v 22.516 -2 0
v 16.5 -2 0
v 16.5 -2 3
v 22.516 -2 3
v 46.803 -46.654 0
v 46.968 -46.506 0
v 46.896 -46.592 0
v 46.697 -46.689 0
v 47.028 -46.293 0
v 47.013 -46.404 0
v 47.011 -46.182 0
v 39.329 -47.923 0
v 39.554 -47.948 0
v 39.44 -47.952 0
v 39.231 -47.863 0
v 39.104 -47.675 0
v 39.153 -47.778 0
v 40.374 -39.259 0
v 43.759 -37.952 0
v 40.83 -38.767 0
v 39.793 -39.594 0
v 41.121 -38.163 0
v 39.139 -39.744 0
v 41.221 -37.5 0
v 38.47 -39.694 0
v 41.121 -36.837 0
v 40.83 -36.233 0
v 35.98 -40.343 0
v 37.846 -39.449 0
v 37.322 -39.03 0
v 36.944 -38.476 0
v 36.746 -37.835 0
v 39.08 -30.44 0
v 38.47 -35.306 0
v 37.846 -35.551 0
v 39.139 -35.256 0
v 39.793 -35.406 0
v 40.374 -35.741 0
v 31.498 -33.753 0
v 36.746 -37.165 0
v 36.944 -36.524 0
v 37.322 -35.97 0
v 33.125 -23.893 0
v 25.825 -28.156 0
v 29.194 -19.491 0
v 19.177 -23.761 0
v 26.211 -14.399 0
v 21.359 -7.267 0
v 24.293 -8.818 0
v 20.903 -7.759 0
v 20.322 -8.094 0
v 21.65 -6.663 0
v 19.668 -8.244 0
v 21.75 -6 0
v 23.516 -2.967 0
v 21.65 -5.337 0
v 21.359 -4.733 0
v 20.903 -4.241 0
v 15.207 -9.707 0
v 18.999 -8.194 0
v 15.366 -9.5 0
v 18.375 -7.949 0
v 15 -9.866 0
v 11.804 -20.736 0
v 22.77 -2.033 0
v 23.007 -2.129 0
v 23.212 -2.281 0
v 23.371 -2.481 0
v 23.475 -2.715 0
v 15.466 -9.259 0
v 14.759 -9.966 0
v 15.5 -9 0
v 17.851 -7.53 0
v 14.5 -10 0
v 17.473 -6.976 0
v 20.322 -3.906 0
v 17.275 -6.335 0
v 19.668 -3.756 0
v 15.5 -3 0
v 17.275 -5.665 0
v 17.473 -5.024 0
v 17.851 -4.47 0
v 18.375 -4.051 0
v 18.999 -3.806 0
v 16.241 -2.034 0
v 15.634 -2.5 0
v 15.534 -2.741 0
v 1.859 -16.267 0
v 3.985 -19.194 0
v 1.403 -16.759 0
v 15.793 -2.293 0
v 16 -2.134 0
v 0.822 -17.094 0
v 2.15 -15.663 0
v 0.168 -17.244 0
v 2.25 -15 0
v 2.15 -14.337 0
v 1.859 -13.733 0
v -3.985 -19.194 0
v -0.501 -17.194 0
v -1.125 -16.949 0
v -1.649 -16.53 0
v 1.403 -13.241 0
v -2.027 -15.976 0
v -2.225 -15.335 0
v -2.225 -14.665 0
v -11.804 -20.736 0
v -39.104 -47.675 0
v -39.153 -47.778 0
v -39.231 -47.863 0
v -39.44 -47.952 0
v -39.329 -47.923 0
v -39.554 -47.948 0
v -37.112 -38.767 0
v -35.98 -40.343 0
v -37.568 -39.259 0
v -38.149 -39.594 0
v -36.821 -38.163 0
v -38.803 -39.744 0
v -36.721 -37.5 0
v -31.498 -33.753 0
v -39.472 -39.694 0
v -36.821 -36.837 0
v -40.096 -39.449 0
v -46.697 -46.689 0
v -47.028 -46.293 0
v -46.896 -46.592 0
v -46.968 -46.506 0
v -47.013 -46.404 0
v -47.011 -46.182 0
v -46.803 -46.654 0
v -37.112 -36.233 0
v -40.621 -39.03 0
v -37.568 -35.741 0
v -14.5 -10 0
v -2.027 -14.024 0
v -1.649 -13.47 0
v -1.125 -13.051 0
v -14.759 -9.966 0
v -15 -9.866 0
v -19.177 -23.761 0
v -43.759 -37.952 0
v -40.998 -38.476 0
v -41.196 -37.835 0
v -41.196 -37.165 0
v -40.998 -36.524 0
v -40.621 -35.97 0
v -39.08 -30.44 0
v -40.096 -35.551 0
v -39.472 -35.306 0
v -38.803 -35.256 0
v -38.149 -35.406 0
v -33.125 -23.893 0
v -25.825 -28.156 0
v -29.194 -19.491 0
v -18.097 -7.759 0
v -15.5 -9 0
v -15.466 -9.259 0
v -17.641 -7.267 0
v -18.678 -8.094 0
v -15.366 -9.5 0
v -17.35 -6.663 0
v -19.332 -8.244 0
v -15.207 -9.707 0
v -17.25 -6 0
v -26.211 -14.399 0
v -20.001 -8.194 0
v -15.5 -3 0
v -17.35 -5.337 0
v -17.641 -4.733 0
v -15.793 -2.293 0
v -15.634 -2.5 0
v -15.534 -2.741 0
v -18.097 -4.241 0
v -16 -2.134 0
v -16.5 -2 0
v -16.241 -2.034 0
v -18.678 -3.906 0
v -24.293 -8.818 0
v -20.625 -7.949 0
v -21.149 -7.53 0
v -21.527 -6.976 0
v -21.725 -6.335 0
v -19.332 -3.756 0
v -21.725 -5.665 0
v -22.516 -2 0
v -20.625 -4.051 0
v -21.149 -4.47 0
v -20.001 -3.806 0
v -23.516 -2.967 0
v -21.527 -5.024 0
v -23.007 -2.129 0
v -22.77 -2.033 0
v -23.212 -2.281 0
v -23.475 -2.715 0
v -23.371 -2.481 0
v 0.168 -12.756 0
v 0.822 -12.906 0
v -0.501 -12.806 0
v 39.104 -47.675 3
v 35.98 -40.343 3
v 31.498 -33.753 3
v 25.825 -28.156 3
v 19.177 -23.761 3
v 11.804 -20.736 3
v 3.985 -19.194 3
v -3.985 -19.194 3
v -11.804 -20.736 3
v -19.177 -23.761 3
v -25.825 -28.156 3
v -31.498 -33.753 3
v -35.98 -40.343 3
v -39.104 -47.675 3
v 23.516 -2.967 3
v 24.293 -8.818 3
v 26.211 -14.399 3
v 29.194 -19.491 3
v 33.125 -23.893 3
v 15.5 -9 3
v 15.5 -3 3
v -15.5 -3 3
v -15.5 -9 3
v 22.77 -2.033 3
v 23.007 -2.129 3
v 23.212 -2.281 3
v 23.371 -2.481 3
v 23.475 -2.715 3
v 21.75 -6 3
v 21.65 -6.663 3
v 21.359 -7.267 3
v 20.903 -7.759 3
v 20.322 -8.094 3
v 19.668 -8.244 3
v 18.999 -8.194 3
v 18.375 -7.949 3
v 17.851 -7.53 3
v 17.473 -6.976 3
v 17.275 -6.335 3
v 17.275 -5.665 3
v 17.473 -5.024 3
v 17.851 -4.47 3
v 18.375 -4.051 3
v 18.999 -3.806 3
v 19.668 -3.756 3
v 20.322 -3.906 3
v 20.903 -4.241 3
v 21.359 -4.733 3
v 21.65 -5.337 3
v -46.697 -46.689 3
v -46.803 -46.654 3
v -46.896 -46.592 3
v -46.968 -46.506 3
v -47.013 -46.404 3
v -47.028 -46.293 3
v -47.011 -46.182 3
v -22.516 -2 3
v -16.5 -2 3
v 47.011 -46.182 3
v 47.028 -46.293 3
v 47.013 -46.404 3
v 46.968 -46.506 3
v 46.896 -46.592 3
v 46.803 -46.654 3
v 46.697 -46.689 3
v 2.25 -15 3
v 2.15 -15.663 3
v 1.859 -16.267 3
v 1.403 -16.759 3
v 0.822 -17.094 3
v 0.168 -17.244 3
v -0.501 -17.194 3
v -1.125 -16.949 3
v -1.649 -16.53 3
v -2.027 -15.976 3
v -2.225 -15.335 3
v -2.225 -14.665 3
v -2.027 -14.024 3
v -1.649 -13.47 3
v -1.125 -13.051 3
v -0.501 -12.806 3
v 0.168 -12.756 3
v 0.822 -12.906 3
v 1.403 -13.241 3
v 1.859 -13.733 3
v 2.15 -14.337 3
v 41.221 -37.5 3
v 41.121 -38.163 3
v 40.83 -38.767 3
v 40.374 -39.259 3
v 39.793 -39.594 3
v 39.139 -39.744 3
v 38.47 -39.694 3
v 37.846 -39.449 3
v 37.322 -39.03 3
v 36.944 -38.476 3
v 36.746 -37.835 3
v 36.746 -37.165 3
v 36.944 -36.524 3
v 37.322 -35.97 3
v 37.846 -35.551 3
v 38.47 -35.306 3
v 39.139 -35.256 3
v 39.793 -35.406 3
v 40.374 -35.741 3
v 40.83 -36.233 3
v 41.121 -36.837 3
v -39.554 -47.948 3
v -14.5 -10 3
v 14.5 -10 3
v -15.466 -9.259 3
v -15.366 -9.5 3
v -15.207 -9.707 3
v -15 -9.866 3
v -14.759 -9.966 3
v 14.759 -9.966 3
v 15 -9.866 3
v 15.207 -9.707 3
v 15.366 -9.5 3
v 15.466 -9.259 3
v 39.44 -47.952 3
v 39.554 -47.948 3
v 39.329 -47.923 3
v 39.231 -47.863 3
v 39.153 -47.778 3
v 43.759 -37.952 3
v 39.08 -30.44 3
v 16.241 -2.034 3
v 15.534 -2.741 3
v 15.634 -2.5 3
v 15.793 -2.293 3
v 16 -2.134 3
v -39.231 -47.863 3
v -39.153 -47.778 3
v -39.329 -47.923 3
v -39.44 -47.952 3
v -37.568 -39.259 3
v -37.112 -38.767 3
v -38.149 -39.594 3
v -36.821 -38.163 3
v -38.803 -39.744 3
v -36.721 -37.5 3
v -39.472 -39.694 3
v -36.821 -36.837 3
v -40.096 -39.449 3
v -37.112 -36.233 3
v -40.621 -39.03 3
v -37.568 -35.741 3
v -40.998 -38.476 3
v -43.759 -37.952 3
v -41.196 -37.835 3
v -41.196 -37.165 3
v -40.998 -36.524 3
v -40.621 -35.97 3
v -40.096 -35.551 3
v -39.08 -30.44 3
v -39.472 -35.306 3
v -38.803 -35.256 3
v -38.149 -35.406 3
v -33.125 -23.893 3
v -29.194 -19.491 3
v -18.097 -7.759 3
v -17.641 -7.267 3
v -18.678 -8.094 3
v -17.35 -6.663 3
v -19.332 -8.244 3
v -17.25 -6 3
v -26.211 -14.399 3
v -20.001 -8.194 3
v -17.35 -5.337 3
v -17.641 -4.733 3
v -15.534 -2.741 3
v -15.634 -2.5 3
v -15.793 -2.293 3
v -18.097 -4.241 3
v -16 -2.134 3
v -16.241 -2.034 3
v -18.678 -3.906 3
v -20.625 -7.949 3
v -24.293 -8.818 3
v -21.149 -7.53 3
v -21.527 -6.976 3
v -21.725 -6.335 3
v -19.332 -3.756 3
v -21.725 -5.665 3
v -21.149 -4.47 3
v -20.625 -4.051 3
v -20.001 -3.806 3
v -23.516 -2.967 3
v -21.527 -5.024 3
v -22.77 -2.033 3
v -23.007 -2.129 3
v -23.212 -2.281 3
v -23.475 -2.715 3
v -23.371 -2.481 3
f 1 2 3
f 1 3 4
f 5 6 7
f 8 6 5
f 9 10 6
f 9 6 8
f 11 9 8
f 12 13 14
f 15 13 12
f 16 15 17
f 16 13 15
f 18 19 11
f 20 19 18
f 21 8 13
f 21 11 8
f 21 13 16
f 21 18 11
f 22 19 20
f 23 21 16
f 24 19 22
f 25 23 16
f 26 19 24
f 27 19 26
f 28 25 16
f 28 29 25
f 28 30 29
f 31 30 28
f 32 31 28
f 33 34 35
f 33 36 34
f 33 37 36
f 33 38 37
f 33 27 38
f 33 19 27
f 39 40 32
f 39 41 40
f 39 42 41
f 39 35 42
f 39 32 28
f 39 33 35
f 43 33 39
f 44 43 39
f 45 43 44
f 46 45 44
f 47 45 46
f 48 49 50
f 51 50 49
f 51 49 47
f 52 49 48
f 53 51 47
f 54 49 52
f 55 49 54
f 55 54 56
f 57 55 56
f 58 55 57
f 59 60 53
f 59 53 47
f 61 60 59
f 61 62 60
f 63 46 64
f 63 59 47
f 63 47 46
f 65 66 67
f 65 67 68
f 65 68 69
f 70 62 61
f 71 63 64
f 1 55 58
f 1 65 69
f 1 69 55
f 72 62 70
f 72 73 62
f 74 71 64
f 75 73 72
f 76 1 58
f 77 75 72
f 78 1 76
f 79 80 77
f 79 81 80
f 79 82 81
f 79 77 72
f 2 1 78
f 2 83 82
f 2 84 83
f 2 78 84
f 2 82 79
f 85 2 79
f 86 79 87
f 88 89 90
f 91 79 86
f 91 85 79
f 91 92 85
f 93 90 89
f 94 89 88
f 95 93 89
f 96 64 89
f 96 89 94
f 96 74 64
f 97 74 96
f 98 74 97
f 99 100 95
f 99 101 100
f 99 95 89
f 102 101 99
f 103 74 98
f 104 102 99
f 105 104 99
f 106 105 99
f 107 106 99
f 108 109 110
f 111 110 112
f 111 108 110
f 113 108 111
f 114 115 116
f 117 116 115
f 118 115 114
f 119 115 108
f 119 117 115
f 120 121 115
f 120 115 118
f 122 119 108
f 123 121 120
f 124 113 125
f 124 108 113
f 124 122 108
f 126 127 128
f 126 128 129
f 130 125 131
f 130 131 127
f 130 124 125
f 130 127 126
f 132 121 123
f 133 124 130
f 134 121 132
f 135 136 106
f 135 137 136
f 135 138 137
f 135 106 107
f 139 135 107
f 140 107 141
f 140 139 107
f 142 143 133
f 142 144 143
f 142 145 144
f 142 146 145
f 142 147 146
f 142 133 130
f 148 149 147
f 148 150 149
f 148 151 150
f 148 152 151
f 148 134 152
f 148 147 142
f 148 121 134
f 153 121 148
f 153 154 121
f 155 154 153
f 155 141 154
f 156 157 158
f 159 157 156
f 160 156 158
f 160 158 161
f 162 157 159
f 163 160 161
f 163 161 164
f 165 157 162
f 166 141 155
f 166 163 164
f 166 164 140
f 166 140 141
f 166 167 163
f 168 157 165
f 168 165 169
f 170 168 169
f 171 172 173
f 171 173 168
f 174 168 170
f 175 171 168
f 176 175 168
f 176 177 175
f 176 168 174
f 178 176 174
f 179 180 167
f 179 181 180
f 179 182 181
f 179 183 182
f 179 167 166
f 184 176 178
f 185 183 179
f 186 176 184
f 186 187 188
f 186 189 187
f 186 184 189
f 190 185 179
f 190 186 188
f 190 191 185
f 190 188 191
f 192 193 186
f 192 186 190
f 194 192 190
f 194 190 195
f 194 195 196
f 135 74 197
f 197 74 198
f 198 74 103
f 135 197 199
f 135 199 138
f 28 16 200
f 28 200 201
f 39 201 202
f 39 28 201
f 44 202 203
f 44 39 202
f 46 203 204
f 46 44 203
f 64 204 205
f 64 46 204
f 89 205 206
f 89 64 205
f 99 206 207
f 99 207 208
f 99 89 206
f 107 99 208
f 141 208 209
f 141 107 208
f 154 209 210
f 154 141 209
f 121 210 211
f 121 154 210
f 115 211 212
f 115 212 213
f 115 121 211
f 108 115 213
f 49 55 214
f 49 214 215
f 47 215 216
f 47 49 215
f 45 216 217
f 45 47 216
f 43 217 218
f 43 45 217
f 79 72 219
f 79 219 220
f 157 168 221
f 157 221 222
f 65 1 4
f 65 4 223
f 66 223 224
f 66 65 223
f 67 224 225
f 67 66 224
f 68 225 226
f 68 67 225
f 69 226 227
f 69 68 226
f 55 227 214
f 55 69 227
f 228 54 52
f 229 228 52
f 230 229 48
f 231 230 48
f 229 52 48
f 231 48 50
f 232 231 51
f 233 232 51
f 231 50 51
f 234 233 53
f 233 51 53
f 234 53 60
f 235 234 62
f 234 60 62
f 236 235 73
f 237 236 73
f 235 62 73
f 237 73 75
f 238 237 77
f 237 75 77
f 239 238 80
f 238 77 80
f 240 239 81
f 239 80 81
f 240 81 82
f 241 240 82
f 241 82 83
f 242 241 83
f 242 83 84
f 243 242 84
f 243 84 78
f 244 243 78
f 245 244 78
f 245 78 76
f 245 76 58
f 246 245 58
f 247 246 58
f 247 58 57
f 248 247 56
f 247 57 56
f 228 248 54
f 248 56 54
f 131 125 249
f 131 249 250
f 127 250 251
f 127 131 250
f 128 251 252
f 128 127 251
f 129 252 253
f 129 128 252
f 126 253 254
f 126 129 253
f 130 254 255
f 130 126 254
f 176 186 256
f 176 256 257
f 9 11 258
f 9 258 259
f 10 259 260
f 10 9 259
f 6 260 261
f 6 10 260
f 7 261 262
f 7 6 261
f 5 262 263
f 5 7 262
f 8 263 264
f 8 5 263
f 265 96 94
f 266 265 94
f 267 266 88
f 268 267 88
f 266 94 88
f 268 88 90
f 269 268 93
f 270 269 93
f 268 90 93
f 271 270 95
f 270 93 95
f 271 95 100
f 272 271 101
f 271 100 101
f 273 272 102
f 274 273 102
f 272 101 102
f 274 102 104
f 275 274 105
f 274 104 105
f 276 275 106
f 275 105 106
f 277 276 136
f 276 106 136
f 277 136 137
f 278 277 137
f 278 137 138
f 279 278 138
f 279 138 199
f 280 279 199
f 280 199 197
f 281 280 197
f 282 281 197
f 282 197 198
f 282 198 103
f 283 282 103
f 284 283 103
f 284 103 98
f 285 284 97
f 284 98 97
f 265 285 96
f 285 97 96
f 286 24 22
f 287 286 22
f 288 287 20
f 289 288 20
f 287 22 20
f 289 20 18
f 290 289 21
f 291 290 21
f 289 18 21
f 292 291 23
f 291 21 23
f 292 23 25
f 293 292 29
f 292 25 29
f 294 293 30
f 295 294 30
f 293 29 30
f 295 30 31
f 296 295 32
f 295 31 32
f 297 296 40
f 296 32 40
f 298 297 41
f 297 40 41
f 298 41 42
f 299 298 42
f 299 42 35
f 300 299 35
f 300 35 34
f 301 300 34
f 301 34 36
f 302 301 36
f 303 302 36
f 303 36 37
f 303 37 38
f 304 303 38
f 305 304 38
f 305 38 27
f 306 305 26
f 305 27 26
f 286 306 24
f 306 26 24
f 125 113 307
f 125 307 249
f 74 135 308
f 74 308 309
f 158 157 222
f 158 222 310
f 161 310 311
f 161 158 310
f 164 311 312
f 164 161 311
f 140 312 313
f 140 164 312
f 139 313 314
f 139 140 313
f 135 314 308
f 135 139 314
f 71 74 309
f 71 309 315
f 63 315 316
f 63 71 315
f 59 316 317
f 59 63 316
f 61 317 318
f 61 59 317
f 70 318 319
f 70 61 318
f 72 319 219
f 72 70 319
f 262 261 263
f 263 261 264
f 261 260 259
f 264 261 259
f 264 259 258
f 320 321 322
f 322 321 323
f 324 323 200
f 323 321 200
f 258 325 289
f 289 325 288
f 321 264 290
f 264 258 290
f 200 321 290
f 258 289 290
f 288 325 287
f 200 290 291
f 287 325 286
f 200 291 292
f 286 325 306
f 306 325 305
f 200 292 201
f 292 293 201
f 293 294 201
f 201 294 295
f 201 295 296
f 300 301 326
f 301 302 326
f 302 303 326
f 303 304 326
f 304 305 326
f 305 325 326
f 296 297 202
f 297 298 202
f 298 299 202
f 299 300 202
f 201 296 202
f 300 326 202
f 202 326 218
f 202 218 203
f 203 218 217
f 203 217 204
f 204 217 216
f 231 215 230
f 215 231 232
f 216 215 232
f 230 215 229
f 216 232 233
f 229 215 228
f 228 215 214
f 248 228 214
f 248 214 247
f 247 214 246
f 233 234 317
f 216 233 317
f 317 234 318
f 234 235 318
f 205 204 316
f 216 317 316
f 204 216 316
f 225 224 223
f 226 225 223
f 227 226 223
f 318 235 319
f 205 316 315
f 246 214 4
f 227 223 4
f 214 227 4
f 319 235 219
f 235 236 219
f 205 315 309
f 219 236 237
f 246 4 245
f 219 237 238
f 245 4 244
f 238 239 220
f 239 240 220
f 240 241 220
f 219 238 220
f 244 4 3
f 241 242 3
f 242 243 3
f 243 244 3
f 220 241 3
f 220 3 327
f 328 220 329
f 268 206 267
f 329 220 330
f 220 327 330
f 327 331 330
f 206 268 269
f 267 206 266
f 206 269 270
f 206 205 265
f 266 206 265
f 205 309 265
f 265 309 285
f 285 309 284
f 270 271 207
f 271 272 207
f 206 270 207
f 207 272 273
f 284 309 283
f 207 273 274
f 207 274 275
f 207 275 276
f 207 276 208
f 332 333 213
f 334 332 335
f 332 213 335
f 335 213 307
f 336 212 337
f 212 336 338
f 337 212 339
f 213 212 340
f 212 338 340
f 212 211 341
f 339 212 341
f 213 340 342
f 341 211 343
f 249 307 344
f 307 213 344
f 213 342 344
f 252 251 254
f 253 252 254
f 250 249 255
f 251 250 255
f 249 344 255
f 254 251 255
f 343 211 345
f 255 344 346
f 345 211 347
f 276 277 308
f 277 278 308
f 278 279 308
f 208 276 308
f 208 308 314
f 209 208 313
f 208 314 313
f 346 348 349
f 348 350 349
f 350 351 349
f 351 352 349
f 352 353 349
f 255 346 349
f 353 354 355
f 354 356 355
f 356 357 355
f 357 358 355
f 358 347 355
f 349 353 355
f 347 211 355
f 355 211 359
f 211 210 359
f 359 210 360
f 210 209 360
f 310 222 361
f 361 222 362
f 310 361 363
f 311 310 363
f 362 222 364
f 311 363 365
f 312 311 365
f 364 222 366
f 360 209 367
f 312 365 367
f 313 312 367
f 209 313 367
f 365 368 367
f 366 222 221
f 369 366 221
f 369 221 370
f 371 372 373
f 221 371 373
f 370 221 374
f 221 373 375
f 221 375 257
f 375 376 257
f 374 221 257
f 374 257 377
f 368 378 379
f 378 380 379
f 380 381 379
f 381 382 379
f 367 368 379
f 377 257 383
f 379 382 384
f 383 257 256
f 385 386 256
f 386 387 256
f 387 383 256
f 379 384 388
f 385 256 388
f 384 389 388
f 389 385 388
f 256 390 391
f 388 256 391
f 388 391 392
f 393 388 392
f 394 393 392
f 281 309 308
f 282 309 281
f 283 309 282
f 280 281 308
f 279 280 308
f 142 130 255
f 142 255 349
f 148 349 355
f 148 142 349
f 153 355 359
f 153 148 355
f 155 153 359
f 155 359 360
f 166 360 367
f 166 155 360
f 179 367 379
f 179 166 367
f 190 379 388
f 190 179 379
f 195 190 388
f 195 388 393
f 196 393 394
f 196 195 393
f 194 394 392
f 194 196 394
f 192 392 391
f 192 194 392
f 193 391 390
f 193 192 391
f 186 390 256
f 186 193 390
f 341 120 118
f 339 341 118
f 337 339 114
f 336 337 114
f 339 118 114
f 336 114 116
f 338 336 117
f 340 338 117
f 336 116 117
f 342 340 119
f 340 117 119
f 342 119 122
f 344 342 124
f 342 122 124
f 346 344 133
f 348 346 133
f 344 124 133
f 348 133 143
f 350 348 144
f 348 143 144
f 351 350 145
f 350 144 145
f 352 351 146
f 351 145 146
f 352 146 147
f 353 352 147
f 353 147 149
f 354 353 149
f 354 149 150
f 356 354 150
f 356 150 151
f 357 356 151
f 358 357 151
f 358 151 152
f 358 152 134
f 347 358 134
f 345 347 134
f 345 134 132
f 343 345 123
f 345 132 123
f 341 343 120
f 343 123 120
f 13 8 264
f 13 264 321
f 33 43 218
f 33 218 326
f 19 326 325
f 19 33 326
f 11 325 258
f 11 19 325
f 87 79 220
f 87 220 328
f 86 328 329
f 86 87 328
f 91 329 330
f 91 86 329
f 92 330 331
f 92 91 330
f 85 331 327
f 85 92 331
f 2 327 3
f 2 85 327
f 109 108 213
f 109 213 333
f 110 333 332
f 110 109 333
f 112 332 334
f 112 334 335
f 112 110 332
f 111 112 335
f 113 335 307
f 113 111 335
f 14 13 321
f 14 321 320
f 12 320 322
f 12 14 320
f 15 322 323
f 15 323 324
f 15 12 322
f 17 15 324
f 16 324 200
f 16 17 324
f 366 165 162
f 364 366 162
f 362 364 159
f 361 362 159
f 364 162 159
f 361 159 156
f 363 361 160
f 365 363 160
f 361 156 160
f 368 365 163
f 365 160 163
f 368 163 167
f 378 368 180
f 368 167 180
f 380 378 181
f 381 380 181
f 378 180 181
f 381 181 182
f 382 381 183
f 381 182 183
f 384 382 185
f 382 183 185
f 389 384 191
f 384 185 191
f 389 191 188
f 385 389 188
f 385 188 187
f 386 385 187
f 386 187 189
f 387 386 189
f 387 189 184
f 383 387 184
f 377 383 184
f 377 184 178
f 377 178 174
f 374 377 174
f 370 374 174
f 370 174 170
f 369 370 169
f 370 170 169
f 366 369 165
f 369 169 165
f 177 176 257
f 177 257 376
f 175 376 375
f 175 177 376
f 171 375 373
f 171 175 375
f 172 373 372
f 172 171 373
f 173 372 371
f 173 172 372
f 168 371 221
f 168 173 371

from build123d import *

# Parameters (mm, degrees)
SKETCH_1_R      = 2.25
EXTRUDE_1_DEPTH = 3


with BuildPart() as part:
    # 草图1 → 凸台-拉伸1 (new body)
    with BuildSketch(Plane(origin=(0, 0, 0), x_dir=(-1, 0, 0), z_dir=(0, 0, -1))):
        with BuildLine():
            Line((-46.697056051, -46.688916039), (-39.554488655, -47.948343383))
            ThreePointArc((-39.554488655, -47.948343383), (-39.277504317, -47.896375463), (-39.103531516, -47.674667428))
            ThreePointArc((-39.103531516, -47.674667428), (0, -19), (39.103531516, -47.674667428))
            ThreePointArc((39.103531516, -47.674667428), (39.277504317, -47.896375463), (39.554488655, -47.948343383))
            Line((39.554488655, -47.948343383), (46.697056051, -46.688916039))
            ThreePointArc((46.697056051, -46.688916039), (46.967515904, -46.505836455), (47.011363008, -46.182194526))
            ThreePointArc((47.011363008, -46.182194526), (41.589384656, -34.090096798), (33.125428162, -23.893130722))
            ThreePointArc((33.125428162, -23.893130722), (26.210916767, -14.399107105), (23.515754966, -2.967438148))
            ThreePointArc((23.515754966, -2.967438148), (23.211784398, -2.281473086), (22.516285244, -2))
            Line((22.516285244, -2), (16.5, -2))
            ThreePointArc((16.5, -2), (15.792893219, -2.292893219), (15.5, -3))
            Line((15.5, -3), (15.5, -9))
            ThreePointArc((15.5, -9), (15.207106781, -9.707106781), (14.5, -10))
            Line((14.5, -10), (-14.5, -10))
            ThreePointArc((-14.5, -10), (-15.207106781, -9.707106781), (-15.5, -9))
            Line((-15.5, -9), (-15.5, -3))
            ThreePointArc((-15.5, -3), (-15.792893219, -2.292893219), (-16.5, -2))
            Line((-16.5, -2), (-22.516285244, -2))
            ThreePointArc((-22.516285244, -2), (-23.211784398, -2.281473086), (-23.515754966, -2.967438148))
            ThreePointArc((-23.515754966, -2.967438148), (-26.210916767, -14.399107105), (-33.125428162, -23.893130722))
            ThreePointArc((-33.125428162, -23.893130722), (-41.589384656, -34.090096798), (-47.011363008, -46.182194526))
            ThreePointArc((-47.011363008, -46.182194526), (-46.967515904, -46.505836455), (-46.697056051, -46.688916039))
        make_face()
        with Locations(Location((-38.97114317, -37.5, 0), (0, 0, 180))):
            Circle(SKETCH_1_R, mode=Mode.SUBTRACT)
        with Locations(Location((19.5, -6, 0), (0, 0, 180))):
            Circle(SKETCH_1_R, mode=Mode.SUBTRACT)
        with Locations(Location((38.97114317, -37.5, 0), (0, 0, 180))):
            Circle(SKETCH_1_R, mode=Mode.SUBTRACT)
        with Locations(Location((0, -15, 0), (0, 0, 180))):
            Circle(SKETCH_1_R, mode=Mode.SUBTRACT)
        with Locations(Location((-19.5, -6, 0), (0, 0, 180))):
            Circle(SKETCH_1_R, mode=Mode.SUBTRACT)
    extrude(amount=-EXTRUDE_1_DEPTH)


solid = part.part
